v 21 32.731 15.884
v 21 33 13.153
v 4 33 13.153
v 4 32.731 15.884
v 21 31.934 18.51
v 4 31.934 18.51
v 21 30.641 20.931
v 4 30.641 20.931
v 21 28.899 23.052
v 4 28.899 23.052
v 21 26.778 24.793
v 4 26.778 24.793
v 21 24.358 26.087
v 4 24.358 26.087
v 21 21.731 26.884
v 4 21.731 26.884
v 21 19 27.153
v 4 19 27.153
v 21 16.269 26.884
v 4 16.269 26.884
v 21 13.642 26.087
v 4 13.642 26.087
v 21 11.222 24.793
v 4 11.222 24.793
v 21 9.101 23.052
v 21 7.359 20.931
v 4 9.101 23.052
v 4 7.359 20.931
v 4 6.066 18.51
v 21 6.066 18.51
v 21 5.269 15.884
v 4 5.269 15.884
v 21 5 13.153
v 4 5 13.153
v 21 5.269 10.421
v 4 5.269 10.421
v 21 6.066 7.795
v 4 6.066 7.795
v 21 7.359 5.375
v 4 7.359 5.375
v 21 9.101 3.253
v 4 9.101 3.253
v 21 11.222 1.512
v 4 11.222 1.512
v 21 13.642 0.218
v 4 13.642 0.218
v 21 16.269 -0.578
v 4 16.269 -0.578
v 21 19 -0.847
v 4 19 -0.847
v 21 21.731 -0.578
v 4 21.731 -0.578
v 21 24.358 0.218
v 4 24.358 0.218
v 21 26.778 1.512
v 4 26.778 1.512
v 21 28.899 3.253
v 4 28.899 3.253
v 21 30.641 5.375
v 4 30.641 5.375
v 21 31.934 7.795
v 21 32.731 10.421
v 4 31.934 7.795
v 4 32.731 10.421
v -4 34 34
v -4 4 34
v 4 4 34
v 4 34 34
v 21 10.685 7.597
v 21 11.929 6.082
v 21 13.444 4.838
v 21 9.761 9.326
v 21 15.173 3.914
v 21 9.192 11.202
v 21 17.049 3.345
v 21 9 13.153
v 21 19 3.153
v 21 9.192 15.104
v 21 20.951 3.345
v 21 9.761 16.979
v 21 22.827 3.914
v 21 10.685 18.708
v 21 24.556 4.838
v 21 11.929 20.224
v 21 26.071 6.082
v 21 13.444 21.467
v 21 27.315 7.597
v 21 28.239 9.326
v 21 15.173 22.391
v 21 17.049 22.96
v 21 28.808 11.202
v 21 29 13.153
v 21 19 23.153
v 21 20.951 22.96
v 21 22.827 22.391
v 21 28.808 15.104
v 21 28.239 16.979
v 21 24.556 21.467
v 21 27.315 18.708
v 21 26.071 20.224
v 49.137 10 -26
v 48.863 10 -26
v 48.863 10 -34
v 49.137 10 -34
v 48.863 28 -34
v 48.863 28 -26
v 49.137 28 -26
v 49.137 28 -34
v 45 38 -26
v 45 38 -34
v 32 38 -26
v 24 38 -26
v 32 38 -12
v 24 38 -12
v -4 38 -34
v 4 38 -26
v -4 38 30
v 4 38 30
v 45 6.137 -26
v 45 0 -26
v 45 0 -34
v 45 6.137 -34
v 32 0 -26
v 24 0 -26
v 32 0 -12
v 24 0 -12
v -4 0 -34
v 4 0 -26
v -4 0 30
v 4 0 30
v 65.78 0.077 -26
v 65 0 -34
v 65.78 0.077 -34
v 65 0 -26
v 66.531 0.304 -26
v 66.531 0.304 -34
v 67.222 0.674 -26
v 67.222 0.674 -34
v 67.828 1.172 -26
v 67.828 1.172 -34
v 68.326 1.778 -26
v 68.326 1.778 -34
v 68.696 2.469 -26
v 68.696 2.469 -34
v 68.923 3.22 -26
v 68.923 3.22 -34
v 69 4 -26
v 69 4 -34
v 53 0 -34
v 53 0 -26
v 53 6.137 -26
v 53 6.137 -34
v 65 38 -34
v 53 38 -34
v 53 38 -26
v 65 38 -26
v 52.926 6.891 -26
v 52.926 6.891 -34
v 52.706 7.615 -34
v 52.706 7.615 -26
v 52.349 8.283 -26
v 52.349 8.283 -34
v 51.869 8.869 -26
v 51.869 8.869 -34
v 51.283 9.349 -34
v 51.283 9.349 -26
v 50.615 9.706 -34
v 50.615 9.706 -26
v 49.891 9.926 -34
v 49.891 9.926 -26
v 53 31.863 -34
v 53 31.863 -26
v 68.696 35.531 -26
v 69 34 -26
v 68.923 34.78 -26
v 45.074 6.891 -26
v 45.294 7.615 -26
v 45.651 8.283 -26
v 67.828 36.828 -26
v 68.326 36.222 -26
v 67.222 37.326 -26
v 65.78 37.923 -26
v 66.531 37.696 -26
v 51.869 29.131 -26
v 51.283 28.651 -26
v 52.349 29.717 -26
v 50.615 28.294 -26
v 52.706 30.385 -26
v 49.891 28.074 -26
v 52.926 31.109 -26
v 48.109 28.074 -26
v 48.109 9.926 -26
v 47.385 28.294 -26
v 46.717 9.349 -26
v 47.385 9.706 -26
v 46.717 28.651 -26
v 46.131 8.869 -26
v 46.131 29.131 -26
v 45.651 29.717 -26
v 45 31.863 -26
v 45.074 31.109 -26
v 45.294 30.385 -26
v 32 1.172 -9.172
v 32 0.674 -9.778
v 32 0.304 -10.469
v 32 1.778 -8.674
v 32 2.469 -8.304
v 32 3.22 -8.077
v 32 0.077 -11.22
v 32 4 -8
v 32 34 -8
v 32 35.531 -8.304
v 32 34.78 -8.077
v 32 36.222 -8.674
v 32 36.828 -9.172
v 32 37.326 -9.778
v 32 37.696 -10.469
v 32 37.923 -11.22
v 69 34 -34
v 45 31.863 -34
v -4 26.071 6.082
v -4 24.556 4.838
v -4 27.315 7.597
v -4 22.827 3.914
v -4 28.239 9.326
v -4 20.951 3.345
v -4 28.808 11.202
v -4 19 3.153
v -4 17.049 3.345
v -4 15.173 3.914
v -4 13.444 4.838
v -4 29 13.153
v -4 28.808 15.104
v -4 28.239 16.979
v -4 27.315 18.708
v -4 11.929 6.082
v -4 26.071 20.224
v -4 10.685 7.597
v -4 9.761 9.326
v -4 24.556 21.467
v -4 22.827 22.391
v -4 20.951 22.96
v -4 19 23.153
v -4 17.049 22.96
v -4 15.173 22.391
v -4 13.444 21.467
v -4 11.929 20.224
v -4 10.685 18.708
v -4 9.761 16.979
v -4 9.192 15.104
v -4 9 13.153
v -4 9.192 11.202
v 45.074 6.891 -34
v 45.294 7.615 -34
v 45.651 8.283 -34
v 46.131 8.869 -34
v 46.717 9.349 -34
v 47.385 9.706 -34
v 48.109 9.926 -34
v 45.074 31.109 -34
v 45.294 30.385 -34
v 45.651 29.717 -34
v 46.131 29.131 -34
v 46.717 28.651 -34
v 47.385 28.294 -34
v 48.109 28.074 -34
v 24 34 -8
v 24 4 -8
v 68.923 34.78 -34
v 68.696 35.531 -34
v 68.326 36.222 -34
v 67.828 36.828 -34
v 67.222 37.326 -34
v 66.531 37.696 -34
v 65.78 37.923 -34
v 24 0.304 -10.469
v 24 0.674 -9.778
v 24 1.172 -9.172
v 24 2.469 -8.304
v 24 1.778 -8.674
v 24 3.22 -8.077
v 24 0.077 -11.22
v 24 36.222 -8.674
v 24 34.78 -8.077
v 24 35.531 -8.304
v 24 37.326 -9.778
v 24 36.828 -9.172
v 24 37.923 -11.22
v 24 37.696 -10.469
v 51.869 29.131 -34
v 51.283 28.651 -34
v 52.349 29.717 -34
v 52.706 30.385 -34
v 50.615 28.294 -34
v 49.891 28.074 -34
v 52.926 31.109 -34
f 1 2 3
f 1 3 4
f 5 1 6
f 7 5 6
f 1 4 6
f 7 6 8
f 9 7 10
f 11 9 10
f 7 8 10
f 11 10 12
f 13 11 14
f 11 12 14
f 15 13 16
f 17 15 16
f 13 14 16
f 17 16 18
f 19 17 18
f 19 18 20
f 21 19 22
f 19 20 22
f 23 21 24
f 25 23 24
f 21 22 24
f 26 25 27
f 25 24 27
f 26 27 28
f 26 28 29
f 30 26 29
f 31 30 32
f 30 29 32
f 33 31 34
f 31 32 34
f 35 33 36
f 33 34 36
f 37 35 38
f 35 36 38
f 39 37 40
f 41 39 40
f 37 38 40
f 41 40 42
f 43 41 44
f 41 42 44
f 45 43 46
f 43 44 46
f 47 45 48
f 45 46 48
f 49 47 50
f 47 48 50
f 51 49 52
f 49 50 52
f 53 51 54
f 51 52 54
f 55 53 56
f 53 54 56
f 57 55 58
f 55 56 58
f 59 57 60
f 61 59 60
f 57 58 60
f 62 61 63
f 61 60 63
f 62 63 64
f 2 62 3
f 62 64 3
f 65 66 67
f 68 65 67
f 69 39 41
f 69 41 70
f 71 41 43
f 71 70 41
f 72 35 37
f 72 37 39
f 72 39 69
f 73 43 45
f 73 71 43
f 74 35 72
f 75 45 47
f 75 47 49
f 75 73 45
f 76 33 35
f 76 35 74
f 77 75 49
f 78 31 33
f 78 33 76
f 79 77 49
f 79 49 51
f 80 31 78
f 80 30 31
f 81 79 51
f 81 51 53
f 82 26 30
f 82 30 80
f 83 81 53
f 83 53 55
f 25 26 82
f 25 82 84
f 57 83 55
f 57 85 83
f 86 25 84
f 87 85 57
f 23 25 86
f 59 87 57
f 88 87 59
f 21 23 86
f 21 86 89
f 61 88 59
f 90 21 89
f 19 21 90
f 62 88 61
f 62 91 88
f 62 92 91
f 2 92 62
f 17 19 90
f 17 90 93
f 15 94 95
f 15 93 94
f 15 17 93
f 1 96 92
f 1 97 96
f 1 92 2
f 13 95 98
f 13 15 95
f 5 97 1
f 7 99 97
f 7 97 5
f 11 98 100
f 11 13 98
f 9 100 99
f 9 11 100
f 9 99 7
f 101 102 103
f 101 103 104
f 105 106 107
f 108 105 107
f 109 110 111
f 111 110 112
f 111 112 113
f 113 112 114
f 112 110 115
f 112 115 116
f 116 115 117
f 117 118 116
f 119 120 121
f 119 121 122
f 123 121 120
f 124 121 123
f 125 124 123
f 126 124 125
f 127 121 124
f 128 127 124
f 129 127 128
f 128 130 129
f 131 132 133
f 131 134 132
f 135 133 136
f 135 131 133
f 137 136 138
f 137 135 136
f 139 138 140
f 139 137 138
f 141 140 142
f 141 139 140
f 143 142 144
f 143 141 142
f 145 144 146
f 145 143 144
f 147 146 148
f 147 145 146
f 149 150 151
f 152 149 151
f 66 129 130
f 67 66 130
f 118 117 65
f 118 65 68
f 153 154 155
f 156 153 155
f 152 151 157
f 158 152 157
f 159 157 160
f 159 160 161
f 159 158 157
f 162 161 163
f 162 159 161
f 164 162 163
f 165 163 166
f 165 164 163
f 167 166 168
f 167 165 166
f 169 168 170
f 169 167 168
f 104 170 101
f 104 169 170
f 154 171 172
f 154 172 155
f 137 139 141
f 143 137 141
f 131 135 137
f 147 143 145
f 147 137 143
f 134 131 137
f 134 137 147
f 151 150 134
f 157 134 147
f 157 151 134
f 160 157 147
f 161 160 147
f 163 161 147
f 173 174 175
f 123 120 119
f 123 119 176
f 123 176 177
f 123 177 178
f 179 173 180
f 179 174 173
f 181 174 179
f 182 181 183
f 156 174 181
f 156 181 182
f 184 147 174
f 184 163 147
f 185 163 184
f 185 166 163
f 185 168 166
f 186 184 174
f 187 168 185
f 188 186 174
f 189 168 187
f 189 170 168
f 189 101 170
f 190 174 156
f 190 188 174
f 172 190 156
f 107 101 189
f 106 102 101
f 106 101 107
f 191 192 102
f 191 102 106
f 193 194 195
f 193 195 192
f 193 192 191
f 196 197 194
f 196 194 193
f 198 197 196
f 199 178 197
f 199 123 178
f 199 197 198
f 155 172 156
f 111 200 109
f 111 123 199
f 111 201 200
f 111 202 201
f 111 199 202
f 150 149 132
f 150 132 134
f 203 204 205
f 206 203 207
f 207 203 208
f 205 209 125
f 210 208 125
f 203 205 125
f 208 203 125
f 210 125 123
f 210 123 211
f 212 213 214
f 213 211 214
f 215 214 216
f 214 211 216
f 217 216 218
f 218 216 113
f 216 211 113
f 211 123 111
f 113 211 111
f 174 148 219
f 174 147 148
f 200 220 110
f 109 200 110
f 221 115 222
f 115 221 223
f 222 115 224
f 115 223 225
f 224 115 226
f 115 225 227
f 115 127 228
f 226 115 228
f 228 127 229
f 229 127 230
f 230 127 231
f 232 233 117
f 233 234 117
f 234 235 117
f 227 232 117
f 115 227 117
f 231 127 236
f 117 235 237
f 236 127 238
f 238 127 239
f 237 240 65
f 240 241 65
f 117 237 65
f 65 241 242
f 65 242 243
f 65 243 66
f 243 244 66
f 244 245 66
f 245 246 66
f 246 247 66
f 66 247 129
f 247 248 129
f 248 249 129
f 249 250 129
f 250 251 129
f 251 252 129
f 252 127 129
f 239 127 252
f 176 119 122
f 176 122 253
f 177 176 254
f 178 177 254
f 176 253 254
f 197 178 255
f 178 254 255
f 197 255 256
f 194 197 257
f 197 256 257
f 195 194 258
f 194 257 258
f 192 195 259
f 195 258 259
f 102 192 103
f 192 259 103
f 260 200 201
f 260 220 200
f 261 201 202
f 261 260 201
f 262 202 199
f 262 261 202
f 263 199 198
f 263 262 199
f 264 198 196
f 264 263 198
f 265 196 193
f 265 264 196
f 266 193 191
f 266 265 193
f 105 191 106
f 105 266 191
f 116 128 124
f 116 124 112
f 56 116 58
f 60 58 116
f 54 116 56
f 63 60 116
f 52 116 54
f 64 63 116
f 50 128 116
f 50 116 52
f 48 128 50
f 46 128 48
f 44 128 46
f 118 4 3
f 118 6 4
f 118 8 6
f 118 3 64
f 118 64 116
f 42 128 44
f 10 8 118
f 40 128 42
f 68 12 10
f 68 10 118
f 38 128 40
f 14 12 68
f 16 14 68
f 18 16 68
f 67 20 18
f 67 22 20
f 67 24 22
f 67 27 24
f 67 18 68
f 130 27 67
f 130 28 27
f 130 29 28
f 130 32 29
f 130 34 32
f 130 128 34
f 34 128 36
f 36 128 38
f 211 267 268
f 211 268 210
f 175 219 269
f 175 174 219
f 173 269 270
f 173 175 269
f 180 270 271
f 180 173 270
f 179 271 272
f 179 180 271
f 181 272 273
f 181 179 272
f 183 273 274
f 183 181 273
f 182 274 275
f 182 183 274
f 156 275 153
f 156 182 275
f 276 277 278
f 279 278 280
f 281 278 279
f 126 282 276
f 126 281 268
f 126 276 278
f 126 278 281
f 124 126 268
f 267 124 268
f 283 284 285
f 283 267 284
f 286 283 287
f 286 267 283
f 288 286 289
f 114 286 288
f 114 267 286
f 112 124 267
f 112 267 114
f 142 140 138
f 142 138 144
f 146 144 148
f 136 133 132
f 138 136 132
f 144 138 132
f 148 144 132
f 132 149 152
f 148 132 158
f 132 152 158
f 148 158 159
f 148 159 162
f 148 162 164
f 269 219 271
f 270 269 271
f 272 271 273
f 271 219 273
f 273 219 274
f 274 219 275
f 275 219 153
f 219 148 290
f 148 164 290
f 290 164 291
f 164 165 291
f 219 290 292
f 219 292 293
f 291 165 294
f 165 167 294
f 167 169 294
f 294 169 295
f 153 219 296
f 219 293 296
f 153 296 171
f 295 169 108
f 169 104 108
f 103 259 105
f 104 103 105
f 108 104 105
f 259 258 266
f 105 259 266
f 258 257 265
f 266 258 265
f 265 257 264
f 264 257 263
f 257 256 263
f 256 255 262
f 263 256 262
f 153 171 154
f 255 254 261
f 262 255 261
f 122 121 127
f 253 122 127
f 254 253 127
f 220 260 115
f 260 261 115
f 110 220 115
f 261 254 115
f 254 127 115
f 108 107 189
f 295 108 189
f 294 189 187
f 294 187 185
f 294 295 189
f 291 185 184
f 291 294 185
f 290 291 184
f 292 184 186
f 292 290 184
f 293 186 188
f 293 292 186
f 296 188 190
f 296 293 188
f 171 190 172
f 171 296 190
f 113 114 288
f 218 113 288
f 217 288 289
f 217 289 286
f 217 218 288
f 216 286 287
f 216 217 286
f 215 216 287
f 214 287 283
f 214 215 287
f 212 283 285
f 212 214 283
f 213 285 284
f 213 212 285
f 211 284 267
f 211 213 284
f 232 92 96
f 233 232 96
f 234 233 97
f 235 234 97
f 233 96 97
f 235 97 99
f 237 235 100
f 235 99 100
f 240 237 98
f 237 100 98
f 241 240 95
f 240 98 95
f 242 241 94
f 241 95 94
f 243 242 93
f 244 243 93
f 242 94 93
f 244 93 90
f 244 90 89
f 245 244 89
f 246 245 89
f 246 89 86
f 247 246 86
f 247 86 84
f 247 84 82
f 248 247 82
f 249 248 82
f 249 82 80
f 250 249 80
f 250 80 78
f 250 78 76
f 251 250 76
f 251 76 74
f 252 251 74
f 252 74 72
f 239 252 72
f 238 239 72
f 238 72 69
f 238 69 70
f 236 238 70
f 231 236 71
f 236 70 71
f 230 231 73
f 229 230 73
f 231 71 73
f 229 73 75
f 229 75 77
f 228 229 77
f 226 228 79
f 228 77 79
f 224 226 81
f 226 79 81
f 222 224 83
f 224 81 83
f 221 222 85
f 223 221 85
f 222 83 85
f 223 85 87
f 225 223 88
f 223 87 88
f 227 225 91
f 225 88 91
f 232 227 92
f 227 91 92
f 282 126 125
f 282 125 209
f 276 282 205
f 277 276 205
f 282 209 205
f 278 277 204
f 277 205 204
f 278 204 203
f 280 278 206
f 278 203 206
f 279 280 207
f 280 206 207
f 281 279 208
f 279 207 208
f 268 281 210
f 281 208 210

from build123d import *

# Parameters (mm, degrees)
F0_W      = 8
F0_H      = 68
F1_DEPTH  = 38
F2_SIZE   = 4
F3_W      = 38
F3_H      = 8
F4_DEPTH  = 65
F5_W      = 8
F5_H      = 38
F6_DEPTH  = 18
F7_R      = 4
F8_R      = 4
F9_W      = 8
F9_H      = 10
F10_DEPTH = 25
F11_R     = 3.862742
F12_R     = 14
F13_DEPTH = 17
F14_R     = 10
F15_DEPTH = 100


with BuildPart() as f1:
    # F0 (on Front) → F1 (new body)
    with BuildSketch(Plane.XZ):
        Rectangle(F0_W, F0_H)
    extrude(amount=-F1_DEPTH)

    # F2
    f2_edges = [f1.edges().sort_by_distance(p)[0] for p in [
        (0, 0, 34),
        (0, 38, 34),
    ]]
    chamfer(f2_edges, length=F2_SIZE)

    # F3 (on face) → F4 (join)
    with BuildSketch(Plane.YZ.offset(4)):
        with Locations((19, -30)):
            Rectangle(F3_W, F3_H)
    extrude(amount=F4_DEPTH)

    # F5 (on face) → F6 (join)
    with BuildSketch(Plane.XY.offset(-26)):
        with Locations((28, 19)):
            Rectangle(F5_W, F5_H)
    extrude(amount=F6_DEPTH)

    # F7
    f7_edges = [f1.edges().sort_by_distance(p)[0] for p in [
        (28, 0, -8),
        (28, 38, -8),
    ]]
    fillet(f7_edges, radius=F7_R)

    # F8
    f8_edges = [f1.edges().sort_by_distance(p)[0] for p in [
        (69, 38, -30),
        (69, 0, -30),
    ]]
    fillet(f8_edges, radius=F8_R)

    # F9 (on face) → F10 (cut)
    with BuildSketch(Plane.XY.offset(-26)):
        with Locations((49, 33)):
            Rectangle(F9_W, F9_H)
        with Locations((49, 5)):
            Rectangle(F9_W, F9_H)
    extrude(amount=-F10_DEPTH, mode=Mode.SUBTRACT)

    # F11
    f11_edges = [f1.edges().sort_by_distance(p)[0] for p in [
        (45, 28, -30),
        (53, 28, -30),
        (45, 10, -30),
        (53, 10, -30),
    ]]
    fillet(f11_edges, radius=F11_R)

    # F12 (on face) → F13 (join)
    with BuildSketch(Plane.YZ.offset(4)):
        with Locations((19, 13.152632)):
            Circle(F12_R)
    extrude(amount=F13_DEPTH)

    # F14 (on face) → F15 (cut)
    with BuildSketch(Plane.YZ.offset(21)):
        with Locations((19, 13.152632)):
            Circle(F14_R)
    extrude(amount=-F15_DEPTH, mode=Mode.SUBTRACT)


solid = f1.part
